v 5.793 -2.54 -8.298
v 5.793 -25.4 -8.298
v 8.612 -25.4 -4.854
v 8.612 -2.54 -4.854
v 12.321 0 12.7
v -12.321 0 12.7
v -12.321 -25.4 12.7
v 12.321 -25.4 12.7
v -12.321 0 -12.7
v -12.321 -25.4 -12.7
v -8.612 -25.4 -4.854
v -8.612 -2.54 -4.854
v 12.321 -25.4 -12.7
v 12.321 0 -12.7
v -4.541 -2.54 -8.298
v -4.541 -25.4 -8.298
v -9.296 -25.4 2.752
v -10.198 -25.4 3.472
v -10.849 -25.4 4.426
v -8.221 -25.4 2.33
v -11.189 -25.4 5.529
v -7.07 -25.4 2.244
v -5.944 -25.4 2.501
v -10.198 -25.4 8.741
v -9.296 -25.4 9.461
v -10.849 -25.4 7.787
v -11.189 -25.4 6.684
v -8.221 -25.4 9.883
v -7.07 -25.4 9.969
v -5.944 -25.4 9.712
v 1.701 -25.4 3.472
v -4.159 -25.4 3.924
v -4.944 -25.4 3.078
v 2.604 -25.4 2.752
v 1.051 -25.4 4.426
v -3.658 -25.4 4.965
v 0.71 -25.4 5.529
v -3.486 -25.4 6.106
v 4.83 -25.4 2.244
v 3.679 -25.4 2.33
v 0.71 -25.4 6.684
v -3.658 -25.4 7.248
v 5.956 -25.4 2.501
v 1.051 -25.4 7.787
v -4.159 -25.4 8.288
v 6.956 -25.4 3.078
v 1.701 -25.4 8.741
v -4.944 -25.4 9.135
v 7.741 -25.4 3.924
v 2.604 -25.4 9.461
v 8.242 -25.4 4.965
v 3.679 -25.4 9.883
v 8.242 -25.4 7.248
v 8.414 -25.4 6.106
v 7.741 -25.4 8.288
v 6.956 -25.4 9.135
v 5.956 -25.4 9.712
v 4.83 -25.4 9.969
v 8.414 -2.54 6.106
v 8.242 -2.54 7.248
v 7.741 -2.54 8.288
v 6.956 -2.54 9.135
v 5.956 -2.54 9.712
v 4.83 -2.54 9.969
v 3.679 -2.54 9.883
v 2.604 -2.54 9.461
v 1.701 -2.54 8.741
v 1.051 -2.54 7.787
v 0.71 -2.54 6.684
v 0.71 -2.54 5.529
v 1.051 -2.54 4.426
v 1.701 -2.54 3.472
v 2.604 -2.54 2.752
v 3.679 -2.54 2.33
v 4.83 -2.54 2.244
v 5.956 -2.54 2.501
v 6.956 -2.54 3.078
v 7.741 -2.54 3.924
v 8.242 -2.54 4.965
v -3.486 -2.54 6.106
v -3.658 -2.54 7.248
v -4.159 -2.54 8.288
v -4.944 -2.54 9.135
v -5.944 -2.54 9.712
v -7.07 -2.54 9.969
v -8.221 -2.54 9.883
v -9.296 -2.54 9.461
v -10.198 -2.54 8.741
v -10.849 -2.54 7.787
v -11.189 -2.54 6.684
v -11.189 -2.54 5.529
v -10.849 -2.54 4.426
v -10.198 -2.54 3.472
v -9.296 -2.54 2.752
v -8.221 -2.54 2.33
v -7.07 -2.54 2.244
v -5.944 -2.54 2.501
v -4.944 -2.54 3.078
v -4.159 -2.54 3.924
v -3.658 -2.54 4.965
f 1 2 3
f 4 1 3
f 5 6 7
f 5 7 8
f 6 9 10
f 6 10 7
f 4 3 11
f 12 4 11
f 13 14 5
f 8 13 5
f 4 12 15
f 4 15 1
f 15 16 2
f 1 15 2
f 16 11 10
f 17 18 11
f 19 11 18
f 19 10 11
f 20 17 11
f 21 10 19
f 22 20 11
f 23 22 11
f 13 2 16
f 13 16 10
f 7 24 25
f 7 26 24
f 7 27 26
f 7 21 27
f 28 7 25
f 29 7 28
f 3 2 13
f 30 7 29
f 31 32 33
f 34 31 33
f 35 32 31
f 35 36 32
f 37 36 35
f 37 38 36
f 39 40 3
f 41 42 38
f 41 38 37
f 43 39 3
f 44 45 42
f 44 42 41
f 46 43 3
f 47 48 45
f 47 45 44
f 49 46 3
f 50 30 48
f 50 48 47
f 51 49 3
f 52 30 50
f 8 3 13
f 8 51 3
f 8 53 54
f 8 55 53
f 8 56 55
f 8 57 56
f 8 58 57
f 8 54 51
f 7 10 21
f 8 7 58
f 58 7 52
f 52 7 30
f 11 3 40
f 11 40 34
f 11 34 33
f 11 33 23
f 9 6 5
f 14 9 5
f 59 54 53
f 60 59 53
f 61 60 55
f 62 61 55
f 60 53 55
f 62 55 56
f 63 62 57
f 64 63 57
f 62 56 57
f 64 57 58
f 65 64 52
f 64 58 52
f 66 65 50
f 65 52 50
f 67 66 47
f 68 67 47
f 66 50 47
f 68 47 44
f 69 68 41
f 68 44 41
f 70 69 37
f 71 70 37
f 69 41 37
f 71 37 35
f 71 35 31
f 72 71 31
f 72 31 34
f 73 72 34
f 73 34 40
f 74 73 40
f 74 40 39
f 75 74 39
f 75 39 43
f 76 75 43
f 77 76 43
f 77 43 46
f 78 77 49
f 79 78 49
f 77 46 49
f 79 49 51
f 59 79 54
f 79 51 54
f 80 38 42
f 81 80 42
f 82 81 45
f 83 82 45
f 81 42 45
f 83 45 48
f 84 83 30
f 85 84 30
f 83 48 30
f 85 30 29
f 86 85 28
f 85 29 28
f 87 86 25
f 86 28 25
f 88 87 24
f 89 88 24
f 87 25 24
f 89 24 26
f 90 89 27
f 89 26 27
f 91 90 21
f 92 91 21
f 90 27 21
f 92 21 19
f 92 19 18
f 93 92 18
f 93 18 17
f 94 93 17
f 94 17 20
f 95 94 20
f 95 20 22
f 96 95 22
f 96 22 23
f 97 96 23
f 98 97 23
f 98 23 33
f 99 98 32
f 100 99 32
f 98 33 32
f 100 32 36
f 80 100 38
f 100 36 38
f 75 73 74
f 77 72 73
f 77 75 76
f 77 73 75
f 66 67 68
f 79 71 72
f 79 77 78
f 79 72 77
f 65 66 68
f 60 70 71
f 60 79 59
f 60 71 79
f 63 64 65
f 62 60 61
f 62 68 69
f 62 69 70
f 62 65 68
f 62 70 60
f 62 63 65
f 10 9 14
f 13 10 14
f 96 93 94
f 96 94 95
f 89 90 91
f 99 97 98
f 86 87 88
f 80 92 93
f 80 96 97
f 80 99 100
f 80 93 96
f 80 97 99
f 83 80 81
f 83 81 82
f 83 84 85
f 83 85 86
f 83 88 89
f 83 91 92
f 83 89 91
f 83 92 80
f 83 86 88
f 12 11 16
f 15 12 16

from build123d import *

# Parameters (mm, degrees)
F0_W     = 24.64179
F0_H     = 25.4
F1_DEPTH = 25.4
F2_R     = 3.8735
F2_R_2   = 3.87346
F3_DEPTH = 22.86


with BuildPart() as f1:
    # F0 (on Front) → F1 (new body)
    with BuildSketch(Plane.XZ):
        Rectangle(F0_W, F0_H)
    extrude(amount=F1_DEPTH)

    # F2 (on face) → F3 (cut)
    with BuildSketch(Plane.XZ.offset(25.4)):
        Polygon((8.611645, -4.853836), (-8.611646, -4.853836), (-4.540686, -8.298493), (0, -8.298493), (5.793288, -8.298493), align=None)
        with Locations((4.540684, 6.106439)):
            Circle(F2_R)
        with Locations((-7.359042, 6.106439)):
            Circle(F2_R_2)
    extrude(amount=-F3_DEPTH, mode=Mode.SUBTRACT)


solid = f1.part
